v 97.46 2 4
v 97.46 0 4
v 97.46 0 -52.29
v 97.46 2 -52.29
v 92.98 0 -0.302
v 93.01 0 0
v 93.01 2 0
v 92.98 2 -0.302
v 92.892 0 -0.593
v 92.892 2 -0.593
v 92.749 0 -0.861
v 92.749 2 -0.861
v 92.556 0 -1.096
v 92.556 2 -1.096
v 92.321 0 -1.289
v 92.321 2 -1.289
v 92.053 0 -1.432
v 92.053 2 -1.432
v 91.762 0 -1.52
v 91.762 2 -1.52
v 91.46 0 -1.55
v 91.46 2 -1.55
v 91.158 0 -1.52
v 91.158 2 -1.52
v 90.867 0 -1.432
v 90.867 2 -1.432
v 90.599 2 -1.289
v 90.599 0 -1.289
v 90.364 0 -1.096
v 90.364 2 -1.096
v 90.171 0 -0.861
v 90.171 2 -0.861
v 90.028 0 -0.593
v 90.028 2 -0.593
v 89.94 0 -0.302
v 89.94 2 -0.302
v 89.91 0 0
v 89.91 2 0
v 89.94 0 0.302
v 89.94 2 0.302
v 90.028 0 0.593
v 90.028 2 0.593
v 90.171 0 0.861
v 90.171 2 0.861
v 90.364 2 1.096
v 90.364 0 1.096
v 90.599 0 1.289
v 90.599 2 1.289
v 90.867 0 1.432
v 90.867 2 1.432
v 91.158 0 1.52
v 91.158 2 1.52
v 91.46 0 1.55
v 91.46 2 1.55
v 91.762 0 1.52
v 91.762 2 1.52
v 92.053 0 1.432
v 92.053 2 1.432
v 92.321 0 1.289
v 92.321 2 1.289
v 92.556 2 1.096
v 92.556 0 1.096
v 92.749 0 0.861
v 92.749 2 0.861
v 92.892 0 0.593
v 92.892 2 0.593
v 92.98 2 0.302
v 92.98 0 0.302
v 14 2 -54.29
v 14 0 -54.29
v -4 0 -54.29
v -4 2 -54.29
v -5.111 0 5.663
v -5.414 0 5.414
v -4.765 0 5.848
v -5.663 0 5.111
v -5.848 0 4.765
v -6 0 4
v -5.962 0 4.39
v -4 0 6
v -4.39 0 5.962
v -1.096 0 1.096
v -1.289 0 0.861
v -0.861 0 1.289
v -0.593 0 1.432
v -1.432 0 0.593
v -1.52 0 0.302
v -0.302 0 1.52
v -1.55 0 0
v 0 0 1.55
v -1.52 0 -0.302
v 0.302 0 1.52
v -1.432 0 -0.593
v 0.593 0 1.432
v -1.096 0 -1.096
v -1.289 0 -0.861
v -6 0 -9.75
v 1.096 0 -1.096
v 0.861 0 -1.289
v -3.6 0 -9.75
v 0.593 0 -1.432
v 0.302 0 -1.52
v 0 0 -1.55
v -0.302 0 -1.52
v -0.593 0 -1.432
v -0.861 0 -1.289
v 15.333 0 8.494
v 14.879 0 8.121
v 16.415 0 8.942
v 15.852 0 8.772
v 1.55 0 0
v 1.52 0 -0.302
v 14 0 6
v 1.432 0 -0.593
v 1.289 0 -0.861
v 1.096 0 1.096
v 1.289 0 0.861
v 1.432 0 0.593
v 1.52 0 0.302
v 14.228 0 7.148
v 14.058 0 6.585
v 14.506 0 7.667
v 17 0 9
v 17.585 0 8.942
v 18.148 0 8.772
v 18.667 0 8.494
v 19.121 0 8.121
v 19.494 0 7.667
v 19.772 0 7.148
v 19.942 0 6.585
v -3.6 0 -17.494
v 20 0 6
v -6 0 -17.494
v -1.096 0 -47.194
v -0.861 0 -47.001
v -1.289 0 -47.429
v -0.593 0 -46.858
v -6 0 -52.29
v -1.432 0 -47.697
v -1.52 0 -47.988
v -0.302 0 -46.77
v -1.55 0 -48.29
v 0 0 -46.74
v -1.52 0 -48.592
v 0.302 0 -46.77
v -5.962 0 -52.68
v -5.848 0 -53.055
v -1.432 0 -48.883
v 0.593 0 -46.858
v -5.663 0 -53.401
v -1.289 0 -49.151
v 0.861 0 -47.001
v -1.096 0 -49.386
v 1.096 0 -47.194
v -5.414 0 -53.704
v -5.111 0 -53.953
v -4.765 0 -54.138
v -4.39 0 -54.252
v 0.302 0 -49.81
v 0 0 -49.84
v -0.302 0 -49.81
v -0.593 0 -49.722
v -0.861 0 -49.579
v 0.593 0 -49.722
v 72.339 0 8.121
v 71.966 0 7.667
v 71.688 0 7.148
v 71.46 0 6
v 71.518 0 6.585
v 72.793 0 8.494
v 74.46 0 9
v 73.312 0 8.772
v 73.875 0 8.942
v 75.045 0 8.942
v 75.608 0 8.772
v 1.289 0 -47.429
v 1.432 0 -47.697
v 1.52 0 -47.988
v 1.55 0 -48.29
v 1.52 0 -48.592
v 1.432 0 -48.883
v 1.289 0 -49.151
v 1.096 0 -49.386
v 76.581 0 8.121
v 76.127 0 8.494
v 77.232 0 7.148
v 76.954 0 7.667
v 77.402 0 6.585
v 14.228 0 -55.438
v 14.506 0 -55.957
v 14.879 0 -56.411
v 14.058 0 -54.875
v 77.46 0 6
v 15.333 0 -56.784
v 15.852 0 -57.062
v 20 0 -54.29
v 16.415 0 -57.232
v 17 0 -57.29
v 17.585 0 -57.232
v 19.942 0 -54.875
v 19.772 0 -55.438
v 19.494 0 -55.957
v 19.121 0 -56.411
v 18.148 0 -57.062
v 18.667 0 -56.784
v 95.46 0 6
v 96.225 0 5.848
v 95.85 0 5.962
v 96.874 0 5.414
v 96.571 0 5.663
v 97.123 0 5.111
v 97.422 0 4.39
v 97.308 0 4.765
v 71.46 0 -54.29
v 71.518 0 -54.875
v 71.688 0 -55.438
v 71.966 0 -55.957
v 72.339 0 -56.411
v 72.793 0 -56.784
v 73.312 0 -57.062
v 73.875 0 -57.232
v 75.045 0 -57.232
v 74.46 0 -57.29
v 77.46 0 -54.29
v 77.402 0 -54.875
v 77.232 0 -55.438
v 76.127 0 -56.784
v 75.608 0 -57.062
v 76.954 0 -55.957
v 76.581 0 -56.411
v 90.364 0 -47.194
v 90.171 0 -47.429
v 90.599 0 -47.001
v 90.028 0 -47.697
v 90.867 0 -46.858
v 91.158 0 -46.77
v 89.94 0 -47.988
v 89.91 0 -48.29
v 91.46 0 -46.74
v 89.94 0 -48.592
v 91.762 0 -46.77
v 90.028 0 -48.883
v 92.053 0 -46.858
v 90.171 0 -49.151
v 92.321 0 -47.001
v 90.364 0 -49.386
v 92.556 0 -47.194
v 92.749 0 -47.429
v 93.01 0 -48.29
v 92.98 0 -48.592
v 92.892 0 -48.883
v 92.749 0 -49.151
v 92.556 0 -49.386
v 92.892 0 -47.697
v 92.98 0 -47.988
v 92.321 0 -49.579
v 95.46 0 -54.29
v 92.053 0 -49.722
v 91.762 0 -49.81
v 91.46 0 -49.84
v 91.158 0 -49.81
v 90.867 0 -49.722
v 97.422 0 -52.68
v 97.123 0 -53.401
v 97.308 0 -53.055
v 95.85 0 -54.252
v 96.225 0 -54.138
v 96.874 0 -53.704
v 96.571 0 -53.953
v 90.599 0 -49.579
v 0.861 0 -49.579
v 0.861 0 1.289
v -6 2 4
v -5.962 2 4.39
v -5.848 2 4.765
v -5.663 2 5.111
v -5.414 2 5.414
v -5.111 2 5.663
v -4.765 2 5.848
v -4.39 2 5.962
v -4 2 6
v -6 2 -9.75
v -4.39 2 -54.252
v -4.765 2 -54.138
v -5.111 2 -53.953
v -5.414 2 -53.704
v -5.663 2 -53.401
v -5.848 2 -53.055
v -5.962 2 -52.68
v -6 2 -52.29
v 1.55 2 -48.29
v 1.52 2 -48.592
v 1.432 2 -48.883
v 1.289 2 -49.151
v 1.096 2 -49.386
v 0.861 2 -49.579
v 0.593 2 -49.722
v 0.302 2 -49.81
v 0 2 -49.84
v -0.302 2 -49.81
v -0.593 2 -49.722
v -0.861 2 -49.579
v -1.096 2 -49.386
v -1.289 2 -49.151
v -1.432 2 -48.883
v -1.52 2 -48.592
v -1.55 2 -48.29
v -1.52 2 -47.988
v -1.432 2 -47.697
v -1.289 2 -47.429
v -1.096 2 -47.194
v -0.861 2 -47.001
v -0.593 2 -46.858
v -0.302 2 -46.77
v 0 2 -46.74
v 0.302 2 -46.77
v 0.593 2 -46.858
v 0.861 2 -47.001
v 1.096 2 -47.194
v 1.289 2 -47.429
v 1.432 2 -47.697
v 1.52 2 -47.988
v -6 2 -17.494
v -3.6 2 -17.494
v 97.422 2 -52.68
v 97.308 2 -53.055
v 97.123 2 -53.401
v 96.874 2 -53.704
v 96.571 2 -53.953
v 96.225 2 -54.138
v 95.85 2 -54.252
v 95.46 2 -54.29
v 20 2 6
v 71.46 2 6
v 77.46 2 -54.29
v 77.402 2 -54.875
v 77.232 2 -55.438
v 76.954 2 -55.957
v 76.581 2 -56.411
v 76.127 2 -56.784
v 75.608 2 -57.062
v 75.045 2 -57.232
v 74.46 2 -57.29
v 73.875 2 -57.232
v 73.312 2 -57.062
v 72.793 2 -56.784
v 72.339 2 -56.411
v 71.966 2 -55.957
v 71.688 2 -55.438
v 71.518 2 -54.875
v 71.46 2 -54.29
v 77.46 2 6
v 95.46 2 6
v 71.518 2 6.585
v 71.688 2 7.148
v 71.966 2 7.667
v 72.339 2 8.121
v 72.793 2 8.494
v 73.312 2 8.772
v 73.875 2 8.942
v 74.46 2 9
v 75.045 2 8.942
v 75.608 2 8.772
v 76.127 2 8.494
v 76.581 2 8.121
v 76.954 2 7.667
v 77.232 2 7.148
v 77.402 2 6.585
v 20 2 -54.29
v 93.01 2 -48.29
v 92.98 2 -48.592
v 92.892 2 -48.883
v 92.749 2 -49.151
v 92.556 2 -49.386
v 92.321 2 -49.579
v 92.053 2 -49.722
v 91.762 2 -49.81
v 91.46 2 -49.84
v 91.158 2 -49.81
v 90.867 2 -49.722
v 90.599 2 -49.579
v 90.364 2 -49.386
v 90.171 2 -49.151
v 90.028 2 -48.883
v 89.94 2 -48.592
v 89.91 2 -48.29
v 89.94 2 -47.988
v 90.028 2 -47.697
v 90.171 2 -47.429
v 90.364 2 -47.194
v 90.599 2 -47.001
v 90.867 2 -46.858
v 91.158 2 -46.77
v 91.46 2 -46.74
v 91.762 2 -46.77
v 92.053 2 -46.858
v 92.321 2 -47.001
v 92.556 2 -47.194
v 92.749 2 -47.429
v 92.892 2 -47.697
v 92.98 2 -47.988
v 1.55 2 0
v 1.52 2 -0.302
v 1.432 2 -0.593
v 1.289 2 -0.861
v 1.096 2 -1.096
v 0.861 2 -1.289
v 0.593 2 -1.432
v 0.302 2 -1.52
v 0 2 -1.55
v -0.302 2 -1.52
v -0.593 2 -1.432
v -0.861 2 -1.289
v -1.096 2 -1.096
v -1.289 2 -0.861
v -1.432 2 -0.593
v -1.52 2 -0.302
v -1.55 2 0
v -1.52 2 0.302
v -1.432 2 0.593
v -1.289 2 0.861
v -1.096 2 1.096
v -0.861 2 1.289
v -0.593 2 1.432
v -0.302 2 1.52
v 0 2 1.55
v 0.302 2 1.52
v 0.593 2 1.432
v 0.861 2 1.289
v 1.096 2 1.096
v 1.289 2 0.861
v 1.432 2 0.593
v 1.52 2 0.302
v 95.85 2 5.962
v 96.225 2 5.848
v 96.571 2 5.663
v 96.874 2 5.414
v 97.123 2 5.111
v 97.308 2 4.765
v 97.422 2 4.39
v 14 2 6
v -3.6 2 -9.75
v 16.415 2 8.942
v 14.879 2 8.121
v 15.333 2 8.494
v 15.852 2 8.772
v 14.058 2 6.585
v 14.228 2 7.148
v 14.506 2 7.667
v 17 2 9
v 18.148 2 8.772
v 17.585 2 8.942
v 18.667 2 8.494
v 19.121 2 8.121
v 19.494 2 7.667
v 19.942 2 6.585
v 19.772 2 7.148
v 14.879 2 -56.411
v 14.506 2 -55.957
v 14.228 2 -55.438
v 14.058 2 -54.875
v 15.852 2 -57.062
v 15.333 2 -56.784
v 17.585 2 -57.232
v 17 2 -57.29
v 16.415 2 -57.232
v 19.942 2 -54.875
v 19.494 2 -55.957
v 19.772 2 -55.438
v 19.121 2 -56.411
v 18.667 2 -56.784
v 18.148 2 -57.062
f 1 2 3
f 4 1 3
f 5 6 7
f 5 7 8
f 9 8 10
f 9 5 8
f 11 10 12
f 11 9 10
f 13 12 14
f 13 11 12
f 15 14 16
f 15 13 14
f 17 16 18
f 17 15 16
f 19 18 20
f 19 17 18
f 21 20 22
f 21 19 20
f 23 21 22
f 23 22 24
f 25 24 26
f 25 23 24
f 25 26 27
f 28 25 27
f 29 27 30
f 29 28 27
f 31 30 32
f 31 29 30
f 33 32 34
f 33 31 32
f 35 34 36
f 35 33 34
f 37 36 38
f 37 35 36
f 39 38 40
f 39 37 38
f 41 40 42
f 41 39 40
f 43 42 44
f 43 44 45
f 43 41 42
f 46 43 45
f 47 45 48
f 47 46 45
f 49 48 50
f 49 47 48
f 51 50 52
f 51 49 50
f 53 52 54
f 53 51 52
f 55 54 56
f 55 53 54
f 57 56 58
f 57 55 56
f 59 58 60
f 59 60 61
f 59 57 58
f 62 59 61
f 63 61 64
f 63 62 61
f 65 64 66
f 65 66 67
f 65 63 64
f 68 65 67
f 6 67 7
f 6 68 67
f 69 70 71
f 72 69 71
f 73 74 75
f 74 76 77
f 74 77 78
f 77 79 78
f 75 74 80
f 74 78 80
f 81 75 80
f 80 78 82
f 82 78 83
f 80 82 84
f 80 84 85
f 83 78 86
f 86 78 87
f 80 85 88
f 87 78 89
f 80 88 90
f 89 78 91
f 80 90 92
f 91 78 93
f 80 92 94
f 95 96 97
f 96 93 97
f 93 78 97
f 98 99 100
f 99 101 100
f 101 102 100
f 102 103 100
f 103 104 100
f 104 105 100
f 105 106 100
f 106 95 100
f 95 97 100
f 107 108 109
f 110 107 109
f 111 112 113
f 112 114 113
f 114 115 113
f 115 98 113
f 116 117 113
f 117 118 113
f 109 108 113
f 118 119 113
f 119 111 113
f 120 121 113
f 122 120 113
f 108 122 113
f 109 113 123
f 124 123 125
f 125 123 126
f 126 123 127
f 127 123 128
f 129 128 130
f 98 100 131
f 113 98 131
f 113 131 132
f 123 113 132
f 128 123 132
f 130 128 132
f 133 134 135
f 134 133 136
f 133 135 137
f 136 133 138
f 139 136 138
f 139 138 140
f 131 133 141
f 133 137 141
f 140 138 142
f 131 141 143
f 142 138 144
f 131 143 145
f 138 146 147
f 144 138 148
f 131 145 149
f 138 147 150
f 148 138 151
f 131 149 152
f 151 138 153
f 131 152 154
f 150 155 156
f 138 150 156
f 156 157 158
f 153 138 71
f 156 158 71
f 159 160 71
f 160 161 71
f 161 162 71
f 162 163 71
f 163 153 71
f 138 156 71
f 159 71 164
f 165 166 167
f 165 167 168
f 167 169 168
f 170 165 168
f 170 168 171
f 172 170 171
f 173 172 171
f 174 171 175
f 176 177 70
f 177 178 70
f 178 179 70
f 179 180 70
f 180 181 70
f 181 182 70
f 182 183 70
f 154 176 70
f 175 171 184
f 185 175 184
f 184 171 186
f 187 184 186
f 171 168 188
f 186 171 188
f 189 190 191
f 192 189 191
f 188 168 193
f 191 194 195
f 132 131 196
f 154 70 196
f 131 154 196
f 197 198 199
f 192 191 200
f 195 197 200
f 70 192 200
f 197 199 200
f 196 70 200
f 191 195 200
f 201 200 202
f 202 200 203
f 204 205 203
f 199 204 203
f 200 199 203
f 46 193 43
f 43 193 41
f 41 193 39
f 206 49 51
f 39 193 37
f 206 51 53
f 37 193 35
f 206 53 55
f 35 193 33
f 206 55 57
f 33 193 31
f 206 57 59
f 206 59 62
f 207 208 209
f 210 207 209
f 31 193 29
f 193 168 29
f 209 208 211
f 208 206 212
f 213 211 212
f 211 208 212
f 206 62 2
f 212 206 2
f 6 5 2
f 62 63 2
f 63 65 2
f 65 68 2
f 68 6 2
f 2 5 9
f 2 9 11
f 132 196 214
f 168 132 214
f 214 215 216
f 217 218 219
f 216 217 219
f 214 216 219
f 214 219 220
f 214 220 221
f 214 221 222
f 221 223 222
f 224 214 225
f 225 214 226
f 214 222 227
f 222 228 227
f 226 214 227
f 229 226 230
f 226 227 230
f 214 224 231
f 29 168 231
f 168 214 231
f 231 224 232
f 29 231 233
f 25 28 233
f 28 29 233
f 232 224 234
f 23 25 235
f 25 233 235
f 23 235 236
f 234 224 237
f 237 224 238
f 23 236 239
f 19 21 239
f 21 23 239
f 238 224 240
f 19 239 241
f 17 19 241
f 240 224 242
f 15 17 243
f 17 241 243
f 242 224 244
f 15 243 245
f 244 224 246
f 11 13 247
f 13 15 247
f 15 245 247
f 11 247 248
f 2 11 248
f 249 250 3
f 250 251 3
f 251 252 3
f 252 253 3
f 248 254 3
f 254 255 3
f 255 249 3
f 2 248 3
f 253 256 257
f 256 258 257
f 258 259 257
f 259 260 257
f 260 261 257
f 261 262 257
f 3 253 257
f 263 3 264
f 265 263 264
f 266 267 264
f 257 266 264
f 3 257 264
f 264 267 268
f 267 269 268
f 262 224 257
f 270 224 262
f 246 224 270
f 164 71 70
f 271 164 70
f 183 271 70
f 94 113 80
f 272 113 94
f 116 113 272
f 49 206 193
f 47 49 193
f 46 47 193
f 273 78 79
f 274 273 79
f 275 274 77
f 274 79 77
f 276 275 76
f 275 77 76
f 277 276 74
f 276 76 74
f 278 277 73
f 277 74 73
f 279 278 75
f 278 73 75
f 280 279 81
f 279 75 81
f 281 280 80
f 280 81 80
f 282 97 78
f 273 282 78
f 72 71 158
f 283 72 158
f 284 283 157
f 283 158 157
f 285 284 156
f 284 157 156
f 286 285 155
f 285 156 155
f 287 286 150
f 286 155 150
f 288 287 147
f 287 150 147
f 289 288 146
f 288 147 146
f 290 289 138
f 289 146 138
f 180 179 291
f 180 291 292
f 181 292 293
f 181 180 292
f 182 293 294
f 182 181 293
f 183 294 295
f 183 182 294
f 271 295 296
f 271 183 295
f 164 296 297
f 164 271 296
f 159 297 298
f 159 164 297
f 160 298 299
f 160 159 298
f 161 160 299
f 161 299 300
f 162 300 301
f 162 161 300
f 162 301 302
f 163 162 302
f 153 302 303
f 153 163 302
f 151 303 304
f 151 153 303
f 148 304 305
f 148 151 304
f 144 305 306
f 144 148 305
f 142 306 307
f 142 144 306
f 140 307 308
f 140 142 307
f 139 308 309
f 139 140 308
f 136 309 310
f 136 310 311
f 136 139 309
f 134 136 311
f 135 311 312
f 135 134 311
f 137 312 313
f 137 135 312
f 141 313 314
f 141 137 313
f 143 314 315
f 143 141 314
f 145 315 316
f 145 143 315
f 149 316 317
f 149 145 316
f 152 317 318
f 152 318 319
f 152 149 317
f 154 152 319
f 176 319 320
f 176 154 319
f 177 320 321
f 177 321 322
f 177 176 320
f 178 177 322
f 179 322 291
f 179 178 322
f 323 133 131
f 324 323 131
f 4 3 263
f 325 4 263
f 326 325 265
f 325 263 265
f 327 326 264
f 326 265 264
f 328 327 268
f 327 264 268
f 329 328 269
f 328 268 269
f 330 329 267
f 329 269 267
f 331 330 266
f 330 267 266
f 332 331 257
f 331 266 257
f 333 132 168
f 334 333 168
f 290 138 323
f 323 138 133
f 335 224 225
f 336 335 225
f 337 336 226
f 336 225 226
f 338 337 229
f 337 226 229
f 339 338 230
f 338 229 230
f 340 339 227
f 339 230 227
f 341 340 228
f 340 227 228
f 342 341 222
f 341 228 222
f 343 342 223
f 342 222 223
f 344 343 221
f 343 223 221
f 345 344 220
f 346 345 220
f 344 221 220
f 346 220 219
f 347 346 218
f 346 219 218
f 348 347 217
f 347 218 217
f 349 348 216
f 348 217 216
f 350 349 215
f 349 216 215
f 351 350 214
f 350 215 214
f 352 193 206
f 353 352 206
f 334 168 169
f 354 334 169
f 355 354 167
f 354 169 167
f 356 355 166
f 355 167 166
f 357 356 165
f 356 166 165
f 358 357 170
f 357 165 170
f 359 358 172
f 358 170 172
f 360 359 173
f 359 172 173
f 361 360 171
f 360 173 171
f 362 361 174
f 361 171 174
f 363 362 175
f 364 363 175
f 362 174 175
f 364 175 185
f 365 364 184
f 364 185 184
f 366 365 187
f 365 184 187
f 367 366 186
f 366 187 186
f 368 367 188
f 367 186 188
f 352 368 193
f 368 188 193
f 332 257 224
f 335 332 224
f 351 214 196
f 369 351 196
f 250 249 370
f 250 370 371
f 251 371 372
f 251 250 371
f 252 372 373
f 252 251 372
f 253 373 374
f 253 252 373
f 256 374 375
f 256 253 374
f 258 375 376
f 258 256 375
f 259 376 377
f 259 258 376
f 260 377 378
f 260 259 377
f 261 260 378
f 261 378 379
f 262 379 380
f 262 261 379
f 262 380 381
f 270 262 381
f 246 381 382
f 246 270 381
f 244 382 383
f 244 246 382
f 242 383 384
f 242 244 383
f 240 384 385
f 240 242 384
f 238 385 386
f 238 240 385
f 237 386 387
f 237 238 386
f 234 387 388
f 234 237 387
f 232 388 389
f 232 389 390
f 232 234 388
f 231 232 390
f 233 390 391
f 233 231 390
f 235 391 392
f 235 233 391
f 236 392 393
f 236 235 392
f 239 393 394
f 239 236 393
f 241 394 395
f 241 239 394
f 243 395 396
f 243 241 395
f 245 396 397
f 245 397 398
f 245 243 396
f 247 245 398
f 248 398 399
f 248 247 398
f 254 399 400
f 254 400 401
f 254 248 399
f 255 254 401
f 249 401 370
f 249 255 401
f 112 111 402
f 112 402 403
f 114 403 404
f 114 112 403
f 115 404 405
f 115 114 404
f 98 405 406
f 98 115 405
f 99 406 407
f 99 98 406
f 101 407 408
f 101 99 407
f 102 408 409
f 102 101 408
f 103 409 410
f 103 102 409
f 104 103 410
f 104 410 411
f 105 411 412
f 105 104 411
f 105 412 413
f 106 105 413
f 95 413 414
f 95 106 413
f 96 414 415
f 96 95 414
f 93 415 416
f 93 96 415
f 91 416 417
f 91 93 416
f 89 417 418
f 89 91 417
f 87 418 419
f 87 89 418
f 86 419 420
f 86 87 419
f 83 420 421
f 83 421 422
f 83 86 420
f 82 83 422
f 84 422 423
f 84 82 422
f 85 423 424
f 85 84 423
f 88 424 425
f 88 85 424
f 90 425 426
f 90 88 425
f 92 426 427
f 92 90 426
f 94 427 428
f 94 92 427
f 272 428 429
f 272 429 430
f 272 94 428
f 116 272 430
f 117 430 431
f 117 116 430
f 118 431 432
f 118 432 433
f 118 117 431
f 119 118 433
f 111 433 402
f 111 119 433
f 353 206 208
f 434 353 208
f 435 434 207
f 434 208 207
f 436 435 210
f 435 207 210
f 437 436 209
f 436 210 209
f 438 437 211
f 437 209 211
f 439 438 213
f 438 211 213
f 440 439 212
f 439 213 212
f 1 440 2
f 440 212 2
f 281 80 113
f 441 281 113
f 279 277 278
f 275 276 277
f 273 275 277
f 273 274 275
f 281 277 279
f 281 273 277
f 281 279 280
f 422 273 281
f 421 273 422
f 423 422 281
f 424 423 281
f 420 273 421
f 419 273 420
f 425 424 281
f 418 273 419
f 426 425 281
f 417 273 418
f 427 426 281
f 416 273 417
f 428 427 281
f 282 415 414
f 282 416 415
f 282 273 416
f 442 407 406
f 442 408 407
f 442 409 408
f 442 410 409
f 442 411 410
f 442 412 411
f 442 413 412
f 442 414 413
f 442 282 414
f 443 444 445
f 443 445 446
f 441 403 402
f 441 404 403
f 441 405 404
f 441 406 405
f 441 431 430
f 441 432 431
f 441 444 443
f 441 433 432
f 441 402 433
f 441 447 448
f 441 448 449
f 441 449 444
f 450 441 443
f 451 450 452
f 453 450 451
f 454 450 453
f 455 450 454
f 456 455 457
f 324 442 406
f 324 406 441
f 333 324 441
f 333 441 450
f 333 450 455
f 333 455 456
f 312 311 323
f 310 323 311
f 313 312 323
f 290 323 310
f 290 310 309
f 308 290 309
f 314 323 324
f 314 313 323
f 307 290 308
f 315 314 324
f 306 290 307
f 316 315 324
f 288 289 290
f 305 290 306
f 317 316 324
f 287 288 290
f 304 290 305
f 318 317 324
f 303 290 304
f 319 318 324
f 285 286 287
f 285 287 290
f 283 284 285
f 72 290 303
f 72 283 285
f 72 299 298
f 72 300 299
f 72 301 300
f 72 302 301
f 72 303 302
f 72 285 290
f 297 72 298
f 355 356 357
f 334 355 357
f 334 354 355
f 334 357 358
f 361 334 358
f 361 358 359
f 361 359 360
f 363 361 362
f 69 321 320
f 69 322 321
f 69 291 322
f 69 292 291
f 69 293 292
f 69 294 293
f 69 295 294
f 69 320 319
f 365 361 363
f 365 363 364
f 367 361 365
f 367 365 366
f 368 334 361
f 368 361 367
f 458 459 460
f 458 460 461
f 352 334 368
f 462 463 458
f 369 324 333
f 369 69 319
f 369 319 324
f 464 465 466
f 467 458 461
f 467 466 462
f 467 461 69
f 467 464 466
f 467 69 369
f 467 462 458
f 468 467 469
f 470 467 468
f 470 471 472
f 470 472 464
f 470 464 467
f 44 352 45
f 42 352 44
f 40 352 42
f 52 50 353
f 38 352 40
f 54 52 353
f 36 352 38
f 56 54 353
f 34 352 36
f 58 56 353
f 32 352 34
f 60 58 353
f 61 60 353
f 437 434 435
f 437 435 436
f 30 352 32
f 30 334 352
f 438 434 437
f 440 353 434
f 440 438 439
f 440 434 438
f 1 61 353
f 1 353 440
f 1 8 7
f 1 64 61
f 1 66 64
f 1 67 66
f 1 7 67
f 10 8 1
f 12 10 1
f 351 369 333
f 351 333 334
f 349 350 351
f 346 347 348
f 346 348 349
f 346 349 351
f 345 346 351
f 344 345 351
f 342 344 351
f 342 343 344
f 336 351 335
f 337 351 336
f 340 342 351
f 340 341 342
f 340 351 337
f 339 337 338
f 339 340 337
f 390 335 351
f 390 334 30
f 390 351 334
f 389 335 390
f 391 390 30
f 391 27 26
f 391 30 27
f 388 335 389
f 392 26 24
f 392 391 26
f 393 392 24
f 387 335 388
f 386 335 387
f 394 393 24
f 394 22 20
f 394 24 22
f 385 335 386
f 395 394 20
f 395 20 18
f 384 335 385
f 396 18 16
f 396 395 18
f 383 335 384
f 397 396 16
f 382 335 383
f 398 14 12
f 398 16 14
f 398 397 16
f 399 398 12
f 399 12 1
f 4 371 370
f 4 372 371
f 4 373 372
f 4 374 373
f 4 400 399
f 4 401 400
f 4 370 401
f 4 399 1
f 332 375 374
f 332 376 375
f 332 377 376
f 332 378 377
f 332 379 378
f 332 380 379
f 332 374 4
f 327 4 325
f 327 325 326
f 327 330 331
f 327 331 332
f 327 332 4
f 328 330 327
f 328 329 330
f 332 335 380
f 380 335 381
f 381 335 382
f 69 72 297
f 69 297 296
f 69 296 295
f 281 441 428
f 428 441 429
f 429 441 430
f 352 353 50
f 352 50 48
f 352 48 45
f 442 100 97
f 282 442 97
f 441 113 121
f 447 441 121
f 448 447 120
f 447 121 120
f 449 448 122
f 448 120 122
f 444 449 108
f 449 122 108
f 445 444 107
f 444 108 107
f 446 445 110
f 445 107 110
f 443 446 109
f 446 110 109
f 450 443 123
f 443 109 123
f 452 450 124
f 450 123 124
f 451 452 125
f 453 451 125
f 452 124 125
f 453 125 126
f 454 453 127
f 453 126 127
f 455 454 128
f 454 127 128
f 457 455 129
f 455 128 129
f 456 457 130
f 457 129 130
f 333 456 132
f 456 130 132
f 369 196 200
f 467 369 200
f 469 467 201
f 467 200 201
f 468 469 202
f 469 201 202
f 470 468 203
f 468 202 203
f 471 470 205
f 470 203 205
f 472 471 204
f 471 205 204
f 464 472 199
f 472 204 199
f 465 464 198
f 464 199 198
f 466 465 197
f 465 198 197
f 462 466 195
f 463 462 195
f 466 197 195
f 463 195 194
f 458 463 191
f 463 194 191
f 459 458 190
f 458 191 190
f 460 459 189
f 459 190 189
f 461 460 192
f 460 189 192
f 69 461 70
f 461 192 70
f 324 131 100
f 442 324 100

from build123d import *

# Parameters (mm, degrees)
SKETCH_1_R      = 1.55
EXTRUDE_1_DEPTH = 2


with BuildPart() as part:
    # 草图1 → 凸台-拉伸1 (new body)
    with BuildSketch(Plane(origin=(0, 0, 0), x_dir=(1, 0, 0), z_dir=(0, 1, 0))):
        with BuildLine():
            Line((97.46, -4), (97.46, 52.29))
            ThreePointArc((97.46, 52.29), (96.874213562, 53.704213562), (95.46, 54.29))
            Line((95.46, 54.29), (77.46, 54.29))
            ThreePointArc((77.46, 54.29), (74.46, 57.29), (71.46, 54.29))
            Line((71.46, 54.29), (20, 54.29))
            ThreePointArc((20, 54.29), (17, 57.29), (14, 54.29))
            Line((14, 54.29), (-4, 54.29))
            ThreePointArc((-4, 54.29), (-5.414213562, 53.704213562), (-6, 52.29))
            Line((-6, 52.29), (-6, 17.493898271))
            Line((-6, 17.493898271), (-3.6, 17.493898271))
            Line((-3.6, 17.493898271), (-3.6, 9.75))
            Line((-3.6, 9.75), (-6, 9.75))
            Line((-6, 9.75), (-6, -4))
            ThreePointArc((-6, -4), (-5.414213562, -5.414213562), (-4, -6))
            Line((-4, -6), (14, -6))
            ThreePointArc((14, -6), (17, -9), (20, -6))
            Line((20, -6), (71.46, -6))
            ThreePointArc((71.46, -6), (74.46, -9), (77.46, -6))
            Line((77.46, -6), (95.46, -6))
            ThreePointArc((95.46, -6), (96.874213562, -5.414213562), (97.46, -4))
        make_face()
        Circle(SKETCH_1_R, mode=Mode.SUBTRACT)
        with Locations((91.46, 0)):
            Circle(SKETCH_1_R, mode=Mode.SUBTRACT)
        with Locations((0, 48.29)):
            Circle(SKETCH_1_R, mode=Mode.SUBTRACT)
        with Locations((91.46, 48.29)):
            Circle(SKETCH_1_R, mode=Mode.SUBTRACT)
    extrude(amount=EXTRUDE_1_DEPTH)


solid = part.part
